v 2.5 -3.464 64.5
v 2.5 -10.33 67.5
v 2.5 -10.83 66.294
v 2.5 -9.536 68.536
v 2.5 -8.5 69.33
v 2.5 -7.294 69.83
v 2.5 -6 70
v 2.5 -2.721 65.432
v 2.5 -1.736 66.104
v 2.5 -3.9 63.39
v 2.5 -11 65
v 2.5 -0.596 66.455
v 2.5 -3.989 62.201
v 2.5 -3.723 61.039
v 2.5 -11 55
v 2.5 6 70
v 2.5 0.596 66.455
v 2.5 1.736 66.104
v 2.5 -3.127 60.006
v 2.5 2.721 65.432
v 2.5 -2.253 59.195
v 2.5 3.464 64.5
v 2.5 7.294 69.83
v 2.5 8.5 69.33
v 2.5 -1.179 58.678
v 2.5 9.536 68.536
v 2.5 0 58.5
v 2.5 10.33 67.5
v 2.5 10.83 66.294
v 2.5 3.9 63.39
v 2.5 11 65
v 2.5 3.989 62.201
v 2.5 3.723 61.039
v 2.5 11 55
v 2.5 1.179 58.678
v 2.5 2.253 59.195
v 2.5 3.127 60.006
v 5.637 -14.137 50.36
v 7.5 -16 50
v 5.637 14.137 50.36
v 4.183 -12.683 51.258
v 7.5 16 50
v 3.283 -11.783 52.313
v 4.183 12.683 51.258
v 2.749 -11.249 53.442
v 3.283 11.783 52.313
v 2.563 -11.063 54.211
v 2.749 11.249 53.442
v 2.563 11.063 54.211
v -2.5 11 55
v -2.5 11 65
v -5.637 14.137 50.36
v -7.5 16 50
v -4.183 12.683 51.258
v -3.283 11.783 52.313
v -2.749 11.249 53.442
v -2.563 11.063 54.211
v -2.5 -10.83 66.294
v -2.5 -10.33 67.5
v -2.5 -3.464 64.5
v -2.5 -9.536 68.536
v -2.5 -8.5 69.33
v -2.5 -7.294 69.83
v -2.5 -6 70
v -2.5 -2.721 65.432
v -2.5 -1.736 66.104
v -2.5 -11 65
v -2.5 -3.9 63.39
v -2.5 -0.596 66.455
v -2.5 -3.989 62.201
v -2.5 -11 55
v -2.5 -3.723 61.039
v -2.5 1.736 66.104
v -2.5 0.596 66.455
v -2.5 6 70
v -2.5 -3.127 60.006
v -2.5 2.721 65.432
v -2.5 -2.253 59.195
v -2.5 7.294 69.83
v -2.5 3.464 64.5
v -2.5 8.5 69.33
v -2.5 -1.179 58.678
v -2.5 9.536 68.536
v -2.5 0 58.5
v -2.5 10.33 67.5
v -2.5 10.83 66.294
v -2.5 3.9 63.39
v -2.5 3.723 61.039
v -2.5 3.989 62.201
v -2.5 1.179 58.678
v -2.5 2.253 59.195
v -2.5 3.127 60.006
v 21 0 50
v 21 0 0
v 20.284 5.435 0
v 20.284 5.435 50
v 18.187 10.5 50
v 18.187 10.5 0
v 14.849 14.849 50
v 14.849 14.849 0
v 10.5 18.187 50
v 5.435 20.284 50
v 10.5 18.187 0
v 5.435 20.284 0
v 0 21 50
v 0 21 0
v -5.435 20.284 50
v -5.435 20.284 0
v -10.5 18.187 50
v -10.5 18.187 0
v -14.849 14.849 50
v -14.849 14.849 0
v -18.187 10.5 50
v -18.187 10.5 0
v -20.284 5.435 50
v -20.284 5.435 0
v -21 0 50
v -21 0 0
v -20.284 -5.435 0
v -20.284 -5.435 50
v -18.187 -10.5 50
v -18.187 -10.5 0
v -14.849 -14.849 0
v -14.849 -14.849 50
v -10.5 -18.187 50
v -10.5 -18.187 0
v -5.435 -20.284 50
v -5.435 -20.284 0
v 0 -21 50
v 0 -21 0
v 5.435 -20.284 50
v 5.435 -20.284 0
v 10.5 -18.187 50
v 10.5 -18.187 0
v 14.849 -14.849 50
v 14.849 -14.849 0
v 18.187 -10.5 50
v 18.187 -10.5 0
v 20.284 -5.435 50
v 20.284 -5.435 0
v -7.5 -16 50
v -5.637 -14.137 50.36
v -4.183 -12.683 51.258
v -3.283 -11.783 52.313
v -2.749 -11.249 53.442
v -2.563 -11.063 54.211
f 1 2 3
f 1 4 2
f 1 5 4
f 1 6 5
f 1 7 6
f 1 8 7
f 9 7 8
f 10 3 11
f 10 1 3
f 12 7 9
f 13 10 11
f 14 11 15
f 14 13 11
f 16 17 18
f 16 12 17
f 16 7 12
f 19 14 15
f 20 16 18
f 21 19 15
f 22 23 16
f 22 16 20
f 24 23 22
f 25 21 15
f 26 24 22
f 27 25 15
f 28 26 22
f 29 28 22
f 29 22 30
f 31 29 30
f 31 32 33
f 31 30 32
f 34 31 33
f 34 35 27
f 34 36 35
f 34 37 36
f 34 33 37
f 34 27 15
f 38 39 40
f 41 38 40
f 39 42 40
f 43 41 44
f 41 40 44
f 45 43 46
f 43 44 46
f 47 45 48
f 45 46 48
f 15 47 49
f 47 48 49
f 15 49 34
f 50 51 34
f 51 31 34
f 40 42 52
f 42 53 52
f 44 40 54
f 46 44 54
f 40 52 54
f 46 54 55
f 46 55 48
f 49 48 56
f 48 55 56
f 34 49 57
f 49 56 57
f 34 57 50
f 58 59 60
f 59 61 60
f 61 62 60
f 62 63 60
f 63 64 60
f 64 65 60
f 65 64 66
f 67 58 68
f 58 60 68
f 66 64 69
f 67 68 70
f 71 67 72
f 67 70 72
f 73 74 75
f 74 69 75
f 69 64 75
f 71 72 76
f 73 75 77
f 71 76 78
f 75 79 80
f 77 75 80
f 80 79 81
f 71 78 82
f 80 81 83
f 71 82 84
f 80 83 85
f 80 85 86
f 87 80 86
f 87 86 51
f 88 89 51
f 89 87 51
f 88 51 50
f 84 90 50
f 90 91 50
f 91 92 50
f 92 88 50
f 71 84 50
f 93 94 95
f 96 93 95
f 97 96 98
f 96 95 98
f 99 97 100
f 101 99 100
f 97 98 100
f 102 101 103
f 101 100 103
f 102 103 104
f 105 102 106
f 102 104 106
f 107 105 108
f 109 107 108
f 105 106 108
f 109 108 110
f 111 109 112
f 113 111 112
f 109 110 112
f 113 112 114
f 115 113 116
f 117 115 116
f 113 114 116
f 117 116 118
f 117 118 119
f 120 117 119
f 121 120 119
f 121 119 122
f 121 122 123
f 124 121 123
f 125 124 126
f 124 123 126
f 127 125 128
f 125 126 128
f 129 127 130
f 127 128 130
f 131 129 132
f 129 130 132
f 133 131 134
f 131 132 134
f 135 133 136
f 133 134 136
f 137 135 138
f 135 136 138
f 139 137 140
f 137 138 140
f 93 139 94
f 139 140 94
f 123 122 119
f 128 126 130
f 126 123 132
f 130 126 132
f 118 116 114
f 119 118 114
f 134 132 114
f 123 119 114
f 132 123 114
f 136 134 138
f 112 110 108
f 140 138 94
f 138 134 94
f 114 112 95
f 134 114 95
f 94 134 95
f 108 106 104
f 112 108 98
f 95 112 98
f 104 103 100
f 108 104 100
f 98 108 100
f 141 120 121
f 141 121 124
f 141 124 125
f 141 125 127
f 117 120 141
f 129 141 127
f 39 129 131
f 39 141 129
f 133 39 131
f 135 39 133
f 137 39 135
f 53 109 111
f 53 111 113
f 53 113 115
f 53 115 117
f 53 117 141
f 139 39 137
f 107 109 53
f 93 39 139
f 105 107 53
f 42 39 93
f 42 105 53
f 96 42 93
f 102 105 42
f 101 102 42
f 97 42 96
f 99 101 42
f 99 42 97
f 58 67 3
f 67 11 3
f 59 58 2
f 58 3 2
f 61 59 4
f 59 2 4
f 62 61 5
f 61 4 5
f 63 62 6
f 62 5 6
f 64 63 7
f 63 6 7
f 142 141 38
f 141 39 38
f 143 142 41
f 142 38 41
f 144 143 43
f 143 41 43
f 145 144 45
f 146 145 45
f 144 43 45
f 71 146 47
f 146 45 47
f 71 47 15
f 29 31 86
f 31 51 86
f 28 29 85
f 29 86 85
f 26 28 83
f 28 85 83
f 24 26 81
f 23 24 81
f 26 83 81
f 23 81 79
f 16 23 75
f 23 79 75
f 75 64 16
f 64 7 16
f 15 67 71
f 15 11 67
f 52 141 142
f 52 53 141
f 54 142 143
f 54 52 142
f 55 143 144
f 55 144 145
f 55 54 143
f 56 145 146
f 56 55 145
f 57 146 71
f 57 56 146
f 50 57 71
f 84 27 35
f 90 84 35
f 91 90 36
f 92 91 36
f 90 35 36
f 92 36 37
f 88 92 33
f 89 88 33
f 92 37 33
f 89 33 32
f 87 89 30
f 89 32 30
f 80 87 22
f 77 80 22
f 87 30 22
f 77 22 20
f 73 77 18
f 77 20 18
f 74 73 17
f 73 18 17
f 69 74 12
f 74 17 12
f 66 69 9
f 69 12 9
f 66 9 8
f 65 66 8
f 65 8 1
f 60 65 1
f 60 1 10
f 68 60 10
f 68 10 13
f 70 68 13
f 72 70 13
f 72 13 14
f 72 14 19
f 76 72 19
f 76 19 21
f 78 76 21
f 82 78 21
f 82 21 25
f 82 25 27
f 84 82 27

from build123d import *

# Parameters (mm, degrees)
SKETCH1_R           = 21
BOSS_EXTRUDE1_DEPTH = 50
SKETCH2_W           = 20
SKETCH2_H           = 22
BOSS_EXTRUDE2_DEPTH = 2.5
FILLET1_R           = 5
FILLET2_R           = 5
SKETCH3_R           = 4
CUT_EXTRUDE1_DEPTH  = 24.5


with BuildPart() as part:
    # Sketch1 → Boss-Extrude1 (new body)
    with BuildSketch(Plane.XY):
        Circle(SKETCH1_R)
    extrude(amount=BOSS_EXTRUDE1_DEPTH)

    # Sketch2 → Boss-Extrude2 (add, symmetric)
    with BuildSketch(Plane(origin=(0, 0, 0), x_dir=(0, 0, -1), z_dir=(1, 0, 0))):
        with Locations((-60, 0)):
            Rectangle(SKETCH2_W, SKETCH2_H)
    extrude(amount=BOSS_EXTRUDE2_DEPTH, both=True)

    # Fillet1
    fillet1_edges = [part.edges().sort_by_distance(p)[0] for p in [
        (-2.5, 0, 50),
        (0, -11, 50),
        (0, 11, 50),
        (2.5, 0, 50),
    ]]
    fillet(fillet1_edges, radius=FILLET1_R)

    # Fillet2
    fillet2_edges = [part.edges().sort_by_distance(p)[0] for p in [
        (0, 11, 70),
        (0, -11, 70),
    ]]
    fillet(fillet2_edges, radius=FILLET2_R)

    # Sketch3 → Cut-Extrude1 (cut, through all)
    with BuildSketch(Plane(origin=(2.5, 0, 0), x_dir=(0, 0, -1), z_dir=(1, 0, 0))):
        with Locations((-62.5, 0)):
            Circle(SKETCH3_R)
    extrude(amount=-CUT_EXTRUDE1_DEPTH, mode=Mode.SUBTRACT)


solid = part.part
